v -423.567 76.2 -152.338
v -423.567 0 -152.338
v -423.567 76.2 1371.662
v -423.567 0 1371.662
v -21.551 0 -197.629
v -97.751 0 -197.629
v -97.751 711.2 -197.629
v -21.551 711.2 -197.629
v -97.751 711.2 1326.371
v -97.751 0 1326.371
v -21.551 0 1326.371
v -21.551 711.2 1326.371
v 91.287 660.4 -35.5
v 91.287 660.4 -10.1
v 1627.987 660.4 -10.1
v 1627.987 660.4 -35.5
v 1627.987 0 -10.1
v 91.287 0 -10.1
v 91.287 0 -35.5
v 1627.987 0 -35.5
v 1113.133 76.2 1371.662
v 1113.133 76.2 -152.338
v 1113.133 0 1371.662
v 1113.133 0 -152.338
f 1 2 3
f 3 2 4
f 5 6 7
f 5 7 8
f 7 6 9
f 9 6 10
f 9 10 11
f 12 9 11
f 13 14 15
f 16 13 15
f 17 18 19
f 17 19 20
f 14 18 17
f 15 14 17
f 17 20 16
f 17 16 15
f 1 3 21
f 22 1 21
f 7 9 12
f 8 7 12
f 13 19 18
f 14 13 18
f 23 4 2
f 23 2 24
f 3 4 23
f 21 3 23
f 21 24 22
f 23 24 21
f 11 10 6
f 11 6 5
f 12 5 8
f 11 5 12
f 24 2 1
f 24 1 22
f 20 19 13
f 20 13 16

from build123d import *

# Parameters (mm, degrees)
F0_W     = 76.2
F0_H     = 1524
F3_DEPTH = 711.2
F1_W     = 1536.7
F1_H     = 25.4
F4_DEPTH = 660.4
F2_W     = 1536.7
F2_H     = 1524
F5_DEPTH = 76.2


with BuildPart() as f3:
    # F0 (on Front) → F3 (new body)
    with BuildSketch(Plane.XZ):
        with Locations((-59.650892, 564.371335)):
            Rectangle(F0_W, F0_H)
    extrude(amount=-F3_DEPTH)


with BuildPart() as f4:
    # F1 (on Front) → F4 (new body)
    with BuildSketch(Plane.XZ):
        with Locations((859.637418, -22.799921)):
            Rectangle(F1_W, F1_H)
    extrude(amount=-F4_DEPTH)


with BuildPart() as f5:
    # F2 (on Front) → F5 (new body)
    with BuildSketch(Plane.XZ):
        with Locations((344.782765, 609.662464)):
            Rectangle(F2_W, F2_H)
    extrude(amount=-F5_DEPTH)


solid = Compound([f3.part, f4.part, f5.part])
